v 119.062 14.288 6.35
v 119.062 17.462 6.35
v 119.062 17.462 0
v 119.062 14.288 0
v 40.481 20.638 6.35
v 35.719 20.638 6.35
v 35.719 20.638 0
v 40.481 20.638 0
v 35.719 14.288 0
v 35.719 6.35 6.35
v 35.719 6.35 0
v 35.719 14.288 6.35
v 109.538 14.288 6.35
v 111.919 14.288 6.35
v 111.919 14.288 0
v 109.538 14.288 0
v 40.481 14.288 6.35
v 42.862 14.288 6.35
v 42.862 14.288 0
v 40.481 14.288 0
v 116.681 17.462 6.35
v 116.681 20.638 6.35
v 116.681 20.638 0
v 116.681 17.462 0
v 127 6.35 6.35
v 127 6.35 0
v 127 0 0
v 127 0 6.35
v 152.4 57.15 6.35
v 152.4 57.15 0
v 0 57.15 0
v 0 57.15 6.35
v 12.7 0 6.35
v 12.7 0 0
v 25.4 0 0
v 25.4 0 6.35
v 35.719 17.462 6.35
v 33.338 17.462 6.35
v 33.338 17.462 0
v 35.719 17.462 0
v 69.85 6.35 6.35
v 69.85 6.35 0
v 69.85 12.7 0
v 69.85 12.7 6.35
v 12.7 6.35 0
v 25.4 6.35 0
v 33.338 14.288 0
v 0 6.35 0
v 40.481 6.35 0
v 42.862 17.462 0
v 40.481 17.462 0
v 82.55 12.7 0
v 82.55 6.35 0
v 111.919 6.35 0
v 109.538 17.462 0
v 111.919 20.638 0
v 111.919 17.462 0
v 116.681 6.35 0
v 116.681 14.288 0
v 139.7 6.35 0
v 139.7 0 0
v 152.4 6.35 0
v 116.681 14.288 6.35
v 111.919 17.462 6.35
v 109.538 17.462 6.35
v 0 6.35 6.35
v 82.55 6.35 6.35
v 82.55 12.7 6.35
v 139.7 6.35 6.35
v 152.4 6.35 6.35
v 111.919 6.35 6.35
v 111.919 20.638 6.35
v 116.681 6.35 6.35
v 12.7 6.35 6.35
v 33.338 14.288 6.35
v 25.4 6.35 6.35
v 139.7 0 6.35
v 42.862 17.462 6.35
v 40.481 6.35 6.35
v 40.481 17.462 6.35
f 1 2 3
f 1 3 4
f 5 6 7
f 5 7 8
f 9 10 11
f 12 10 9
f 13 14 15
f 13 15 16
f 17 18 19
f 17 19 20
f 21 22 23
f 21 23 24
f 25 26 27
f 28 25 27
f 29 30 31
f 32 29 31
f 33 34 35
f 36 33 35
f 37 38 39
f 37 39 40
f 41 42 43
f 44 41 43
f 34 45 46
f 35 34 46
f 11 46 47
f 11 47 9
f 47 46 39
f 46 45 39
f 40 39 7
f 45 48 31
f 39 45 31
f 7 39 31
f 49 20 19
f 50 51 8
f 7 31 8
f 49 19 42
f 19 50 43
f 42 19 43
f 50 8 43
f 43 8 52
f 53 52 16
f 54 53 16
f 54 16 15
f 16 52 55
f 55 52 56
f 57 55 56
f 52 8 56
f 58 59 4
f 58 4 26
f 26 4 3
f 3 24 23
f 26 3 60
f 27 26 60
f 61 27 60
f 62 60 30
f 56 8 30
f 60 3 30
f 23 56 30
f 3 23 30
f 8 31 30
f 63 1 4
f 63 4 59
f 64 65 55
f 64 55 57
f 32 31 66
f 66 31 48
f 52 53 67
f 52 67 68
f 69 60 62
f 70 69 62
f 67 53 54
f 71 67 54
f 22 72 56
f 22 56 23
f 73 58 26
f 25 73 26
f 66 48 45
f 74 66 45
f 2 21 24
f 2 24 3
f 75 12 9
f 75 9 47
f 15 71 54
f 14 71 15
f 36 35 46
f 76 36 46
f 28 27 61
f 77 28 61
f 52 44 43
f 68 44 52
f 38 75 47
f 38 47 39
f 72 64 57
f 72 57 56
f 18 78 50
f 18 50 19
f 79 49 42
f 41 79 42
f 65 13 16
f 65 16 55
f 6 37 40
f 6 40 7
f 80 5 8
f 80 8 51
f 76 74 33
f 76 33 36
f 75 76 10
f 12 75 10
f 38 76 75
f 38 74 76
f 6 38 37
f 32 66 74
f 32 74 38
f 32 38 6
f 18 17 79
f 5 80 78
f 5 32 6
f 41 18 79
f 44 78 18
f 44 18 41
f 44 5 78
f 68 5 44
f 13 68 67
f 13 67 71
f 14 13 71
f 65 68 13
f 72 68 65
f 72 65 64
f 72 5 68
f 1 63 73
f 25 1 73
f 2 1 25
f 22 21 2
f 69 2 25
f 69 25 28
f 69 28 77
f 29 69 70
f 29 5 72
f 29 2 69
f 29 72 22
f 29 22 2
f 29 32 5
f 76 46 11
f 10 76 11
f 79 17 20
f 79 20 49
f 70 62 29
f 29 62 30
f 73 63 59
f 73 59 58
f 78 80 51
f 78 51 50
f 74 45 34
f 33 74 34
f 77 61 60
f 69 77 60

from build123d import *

# Parameters (mm, degrees)
BOSS_EXTRUDE1_DEPTH = 6.35
SKETCH2_W           = 12.7
SKETCH2_H           = 6.35
CUT_EXTRUDE1_DEPTH  = 6.35


with BuildPart() as part:
    # Sketch1 → Boss-Extrude1 (new body)
    with BuildSketch(Plane.XY):
        Polygon((139.7, 6.35), (152.4, 6.35), (152.4, 57.15), (0, 57.15), (0, 6.35), (12.7, 6.35), (12.7, 0), (25.4, 0), (25.4, 6.35), (127, 6.35), (127, 0), (139.7, 0), align=None)
    extrude(amount=BOSS_EXTRUDE1_DEPTH)

    # Sketch2 → Cut-Extrude1 (cut)
    with BuildSketch(Plane.XY.offset(6.35)):
        Polygon((111.91875, 6.35), (111.91875, 14.2875), (109.5375, 14.2875), (109.5375, 17.4625), (111.91875, 17.4625), (111.91875, 20.6375), (116.68125, 20.6375), (116.68125, 17.4625), (119.0625, 17.4625), (119.0625, 14.2875), (116.68125, 14.2875), (116.68125, 6.35), align=None)
        Polygon((42.8625, 17.4625), (42.8625, 14.2875), (40.48125, 14.2875), (40.48125, 6.35), (35.71875, 6.35), (35.71875, 14.2875), (33.3375, 14.2875), (33.3375, 17.4625), (35.71875, 17.4625), (35.71875, 20.6375), (40.48125, 20.6375), (40.48125, 17.4625), align=None)
        with Locations((76.2, 9.525)):
            Rectangle(SKETCH2_W, SKETCH2_H)
    extrude(amount=-CUT_EXTRUDE1_DEPTH, mode=Mode.SUBTRACT)


solid = part.part
